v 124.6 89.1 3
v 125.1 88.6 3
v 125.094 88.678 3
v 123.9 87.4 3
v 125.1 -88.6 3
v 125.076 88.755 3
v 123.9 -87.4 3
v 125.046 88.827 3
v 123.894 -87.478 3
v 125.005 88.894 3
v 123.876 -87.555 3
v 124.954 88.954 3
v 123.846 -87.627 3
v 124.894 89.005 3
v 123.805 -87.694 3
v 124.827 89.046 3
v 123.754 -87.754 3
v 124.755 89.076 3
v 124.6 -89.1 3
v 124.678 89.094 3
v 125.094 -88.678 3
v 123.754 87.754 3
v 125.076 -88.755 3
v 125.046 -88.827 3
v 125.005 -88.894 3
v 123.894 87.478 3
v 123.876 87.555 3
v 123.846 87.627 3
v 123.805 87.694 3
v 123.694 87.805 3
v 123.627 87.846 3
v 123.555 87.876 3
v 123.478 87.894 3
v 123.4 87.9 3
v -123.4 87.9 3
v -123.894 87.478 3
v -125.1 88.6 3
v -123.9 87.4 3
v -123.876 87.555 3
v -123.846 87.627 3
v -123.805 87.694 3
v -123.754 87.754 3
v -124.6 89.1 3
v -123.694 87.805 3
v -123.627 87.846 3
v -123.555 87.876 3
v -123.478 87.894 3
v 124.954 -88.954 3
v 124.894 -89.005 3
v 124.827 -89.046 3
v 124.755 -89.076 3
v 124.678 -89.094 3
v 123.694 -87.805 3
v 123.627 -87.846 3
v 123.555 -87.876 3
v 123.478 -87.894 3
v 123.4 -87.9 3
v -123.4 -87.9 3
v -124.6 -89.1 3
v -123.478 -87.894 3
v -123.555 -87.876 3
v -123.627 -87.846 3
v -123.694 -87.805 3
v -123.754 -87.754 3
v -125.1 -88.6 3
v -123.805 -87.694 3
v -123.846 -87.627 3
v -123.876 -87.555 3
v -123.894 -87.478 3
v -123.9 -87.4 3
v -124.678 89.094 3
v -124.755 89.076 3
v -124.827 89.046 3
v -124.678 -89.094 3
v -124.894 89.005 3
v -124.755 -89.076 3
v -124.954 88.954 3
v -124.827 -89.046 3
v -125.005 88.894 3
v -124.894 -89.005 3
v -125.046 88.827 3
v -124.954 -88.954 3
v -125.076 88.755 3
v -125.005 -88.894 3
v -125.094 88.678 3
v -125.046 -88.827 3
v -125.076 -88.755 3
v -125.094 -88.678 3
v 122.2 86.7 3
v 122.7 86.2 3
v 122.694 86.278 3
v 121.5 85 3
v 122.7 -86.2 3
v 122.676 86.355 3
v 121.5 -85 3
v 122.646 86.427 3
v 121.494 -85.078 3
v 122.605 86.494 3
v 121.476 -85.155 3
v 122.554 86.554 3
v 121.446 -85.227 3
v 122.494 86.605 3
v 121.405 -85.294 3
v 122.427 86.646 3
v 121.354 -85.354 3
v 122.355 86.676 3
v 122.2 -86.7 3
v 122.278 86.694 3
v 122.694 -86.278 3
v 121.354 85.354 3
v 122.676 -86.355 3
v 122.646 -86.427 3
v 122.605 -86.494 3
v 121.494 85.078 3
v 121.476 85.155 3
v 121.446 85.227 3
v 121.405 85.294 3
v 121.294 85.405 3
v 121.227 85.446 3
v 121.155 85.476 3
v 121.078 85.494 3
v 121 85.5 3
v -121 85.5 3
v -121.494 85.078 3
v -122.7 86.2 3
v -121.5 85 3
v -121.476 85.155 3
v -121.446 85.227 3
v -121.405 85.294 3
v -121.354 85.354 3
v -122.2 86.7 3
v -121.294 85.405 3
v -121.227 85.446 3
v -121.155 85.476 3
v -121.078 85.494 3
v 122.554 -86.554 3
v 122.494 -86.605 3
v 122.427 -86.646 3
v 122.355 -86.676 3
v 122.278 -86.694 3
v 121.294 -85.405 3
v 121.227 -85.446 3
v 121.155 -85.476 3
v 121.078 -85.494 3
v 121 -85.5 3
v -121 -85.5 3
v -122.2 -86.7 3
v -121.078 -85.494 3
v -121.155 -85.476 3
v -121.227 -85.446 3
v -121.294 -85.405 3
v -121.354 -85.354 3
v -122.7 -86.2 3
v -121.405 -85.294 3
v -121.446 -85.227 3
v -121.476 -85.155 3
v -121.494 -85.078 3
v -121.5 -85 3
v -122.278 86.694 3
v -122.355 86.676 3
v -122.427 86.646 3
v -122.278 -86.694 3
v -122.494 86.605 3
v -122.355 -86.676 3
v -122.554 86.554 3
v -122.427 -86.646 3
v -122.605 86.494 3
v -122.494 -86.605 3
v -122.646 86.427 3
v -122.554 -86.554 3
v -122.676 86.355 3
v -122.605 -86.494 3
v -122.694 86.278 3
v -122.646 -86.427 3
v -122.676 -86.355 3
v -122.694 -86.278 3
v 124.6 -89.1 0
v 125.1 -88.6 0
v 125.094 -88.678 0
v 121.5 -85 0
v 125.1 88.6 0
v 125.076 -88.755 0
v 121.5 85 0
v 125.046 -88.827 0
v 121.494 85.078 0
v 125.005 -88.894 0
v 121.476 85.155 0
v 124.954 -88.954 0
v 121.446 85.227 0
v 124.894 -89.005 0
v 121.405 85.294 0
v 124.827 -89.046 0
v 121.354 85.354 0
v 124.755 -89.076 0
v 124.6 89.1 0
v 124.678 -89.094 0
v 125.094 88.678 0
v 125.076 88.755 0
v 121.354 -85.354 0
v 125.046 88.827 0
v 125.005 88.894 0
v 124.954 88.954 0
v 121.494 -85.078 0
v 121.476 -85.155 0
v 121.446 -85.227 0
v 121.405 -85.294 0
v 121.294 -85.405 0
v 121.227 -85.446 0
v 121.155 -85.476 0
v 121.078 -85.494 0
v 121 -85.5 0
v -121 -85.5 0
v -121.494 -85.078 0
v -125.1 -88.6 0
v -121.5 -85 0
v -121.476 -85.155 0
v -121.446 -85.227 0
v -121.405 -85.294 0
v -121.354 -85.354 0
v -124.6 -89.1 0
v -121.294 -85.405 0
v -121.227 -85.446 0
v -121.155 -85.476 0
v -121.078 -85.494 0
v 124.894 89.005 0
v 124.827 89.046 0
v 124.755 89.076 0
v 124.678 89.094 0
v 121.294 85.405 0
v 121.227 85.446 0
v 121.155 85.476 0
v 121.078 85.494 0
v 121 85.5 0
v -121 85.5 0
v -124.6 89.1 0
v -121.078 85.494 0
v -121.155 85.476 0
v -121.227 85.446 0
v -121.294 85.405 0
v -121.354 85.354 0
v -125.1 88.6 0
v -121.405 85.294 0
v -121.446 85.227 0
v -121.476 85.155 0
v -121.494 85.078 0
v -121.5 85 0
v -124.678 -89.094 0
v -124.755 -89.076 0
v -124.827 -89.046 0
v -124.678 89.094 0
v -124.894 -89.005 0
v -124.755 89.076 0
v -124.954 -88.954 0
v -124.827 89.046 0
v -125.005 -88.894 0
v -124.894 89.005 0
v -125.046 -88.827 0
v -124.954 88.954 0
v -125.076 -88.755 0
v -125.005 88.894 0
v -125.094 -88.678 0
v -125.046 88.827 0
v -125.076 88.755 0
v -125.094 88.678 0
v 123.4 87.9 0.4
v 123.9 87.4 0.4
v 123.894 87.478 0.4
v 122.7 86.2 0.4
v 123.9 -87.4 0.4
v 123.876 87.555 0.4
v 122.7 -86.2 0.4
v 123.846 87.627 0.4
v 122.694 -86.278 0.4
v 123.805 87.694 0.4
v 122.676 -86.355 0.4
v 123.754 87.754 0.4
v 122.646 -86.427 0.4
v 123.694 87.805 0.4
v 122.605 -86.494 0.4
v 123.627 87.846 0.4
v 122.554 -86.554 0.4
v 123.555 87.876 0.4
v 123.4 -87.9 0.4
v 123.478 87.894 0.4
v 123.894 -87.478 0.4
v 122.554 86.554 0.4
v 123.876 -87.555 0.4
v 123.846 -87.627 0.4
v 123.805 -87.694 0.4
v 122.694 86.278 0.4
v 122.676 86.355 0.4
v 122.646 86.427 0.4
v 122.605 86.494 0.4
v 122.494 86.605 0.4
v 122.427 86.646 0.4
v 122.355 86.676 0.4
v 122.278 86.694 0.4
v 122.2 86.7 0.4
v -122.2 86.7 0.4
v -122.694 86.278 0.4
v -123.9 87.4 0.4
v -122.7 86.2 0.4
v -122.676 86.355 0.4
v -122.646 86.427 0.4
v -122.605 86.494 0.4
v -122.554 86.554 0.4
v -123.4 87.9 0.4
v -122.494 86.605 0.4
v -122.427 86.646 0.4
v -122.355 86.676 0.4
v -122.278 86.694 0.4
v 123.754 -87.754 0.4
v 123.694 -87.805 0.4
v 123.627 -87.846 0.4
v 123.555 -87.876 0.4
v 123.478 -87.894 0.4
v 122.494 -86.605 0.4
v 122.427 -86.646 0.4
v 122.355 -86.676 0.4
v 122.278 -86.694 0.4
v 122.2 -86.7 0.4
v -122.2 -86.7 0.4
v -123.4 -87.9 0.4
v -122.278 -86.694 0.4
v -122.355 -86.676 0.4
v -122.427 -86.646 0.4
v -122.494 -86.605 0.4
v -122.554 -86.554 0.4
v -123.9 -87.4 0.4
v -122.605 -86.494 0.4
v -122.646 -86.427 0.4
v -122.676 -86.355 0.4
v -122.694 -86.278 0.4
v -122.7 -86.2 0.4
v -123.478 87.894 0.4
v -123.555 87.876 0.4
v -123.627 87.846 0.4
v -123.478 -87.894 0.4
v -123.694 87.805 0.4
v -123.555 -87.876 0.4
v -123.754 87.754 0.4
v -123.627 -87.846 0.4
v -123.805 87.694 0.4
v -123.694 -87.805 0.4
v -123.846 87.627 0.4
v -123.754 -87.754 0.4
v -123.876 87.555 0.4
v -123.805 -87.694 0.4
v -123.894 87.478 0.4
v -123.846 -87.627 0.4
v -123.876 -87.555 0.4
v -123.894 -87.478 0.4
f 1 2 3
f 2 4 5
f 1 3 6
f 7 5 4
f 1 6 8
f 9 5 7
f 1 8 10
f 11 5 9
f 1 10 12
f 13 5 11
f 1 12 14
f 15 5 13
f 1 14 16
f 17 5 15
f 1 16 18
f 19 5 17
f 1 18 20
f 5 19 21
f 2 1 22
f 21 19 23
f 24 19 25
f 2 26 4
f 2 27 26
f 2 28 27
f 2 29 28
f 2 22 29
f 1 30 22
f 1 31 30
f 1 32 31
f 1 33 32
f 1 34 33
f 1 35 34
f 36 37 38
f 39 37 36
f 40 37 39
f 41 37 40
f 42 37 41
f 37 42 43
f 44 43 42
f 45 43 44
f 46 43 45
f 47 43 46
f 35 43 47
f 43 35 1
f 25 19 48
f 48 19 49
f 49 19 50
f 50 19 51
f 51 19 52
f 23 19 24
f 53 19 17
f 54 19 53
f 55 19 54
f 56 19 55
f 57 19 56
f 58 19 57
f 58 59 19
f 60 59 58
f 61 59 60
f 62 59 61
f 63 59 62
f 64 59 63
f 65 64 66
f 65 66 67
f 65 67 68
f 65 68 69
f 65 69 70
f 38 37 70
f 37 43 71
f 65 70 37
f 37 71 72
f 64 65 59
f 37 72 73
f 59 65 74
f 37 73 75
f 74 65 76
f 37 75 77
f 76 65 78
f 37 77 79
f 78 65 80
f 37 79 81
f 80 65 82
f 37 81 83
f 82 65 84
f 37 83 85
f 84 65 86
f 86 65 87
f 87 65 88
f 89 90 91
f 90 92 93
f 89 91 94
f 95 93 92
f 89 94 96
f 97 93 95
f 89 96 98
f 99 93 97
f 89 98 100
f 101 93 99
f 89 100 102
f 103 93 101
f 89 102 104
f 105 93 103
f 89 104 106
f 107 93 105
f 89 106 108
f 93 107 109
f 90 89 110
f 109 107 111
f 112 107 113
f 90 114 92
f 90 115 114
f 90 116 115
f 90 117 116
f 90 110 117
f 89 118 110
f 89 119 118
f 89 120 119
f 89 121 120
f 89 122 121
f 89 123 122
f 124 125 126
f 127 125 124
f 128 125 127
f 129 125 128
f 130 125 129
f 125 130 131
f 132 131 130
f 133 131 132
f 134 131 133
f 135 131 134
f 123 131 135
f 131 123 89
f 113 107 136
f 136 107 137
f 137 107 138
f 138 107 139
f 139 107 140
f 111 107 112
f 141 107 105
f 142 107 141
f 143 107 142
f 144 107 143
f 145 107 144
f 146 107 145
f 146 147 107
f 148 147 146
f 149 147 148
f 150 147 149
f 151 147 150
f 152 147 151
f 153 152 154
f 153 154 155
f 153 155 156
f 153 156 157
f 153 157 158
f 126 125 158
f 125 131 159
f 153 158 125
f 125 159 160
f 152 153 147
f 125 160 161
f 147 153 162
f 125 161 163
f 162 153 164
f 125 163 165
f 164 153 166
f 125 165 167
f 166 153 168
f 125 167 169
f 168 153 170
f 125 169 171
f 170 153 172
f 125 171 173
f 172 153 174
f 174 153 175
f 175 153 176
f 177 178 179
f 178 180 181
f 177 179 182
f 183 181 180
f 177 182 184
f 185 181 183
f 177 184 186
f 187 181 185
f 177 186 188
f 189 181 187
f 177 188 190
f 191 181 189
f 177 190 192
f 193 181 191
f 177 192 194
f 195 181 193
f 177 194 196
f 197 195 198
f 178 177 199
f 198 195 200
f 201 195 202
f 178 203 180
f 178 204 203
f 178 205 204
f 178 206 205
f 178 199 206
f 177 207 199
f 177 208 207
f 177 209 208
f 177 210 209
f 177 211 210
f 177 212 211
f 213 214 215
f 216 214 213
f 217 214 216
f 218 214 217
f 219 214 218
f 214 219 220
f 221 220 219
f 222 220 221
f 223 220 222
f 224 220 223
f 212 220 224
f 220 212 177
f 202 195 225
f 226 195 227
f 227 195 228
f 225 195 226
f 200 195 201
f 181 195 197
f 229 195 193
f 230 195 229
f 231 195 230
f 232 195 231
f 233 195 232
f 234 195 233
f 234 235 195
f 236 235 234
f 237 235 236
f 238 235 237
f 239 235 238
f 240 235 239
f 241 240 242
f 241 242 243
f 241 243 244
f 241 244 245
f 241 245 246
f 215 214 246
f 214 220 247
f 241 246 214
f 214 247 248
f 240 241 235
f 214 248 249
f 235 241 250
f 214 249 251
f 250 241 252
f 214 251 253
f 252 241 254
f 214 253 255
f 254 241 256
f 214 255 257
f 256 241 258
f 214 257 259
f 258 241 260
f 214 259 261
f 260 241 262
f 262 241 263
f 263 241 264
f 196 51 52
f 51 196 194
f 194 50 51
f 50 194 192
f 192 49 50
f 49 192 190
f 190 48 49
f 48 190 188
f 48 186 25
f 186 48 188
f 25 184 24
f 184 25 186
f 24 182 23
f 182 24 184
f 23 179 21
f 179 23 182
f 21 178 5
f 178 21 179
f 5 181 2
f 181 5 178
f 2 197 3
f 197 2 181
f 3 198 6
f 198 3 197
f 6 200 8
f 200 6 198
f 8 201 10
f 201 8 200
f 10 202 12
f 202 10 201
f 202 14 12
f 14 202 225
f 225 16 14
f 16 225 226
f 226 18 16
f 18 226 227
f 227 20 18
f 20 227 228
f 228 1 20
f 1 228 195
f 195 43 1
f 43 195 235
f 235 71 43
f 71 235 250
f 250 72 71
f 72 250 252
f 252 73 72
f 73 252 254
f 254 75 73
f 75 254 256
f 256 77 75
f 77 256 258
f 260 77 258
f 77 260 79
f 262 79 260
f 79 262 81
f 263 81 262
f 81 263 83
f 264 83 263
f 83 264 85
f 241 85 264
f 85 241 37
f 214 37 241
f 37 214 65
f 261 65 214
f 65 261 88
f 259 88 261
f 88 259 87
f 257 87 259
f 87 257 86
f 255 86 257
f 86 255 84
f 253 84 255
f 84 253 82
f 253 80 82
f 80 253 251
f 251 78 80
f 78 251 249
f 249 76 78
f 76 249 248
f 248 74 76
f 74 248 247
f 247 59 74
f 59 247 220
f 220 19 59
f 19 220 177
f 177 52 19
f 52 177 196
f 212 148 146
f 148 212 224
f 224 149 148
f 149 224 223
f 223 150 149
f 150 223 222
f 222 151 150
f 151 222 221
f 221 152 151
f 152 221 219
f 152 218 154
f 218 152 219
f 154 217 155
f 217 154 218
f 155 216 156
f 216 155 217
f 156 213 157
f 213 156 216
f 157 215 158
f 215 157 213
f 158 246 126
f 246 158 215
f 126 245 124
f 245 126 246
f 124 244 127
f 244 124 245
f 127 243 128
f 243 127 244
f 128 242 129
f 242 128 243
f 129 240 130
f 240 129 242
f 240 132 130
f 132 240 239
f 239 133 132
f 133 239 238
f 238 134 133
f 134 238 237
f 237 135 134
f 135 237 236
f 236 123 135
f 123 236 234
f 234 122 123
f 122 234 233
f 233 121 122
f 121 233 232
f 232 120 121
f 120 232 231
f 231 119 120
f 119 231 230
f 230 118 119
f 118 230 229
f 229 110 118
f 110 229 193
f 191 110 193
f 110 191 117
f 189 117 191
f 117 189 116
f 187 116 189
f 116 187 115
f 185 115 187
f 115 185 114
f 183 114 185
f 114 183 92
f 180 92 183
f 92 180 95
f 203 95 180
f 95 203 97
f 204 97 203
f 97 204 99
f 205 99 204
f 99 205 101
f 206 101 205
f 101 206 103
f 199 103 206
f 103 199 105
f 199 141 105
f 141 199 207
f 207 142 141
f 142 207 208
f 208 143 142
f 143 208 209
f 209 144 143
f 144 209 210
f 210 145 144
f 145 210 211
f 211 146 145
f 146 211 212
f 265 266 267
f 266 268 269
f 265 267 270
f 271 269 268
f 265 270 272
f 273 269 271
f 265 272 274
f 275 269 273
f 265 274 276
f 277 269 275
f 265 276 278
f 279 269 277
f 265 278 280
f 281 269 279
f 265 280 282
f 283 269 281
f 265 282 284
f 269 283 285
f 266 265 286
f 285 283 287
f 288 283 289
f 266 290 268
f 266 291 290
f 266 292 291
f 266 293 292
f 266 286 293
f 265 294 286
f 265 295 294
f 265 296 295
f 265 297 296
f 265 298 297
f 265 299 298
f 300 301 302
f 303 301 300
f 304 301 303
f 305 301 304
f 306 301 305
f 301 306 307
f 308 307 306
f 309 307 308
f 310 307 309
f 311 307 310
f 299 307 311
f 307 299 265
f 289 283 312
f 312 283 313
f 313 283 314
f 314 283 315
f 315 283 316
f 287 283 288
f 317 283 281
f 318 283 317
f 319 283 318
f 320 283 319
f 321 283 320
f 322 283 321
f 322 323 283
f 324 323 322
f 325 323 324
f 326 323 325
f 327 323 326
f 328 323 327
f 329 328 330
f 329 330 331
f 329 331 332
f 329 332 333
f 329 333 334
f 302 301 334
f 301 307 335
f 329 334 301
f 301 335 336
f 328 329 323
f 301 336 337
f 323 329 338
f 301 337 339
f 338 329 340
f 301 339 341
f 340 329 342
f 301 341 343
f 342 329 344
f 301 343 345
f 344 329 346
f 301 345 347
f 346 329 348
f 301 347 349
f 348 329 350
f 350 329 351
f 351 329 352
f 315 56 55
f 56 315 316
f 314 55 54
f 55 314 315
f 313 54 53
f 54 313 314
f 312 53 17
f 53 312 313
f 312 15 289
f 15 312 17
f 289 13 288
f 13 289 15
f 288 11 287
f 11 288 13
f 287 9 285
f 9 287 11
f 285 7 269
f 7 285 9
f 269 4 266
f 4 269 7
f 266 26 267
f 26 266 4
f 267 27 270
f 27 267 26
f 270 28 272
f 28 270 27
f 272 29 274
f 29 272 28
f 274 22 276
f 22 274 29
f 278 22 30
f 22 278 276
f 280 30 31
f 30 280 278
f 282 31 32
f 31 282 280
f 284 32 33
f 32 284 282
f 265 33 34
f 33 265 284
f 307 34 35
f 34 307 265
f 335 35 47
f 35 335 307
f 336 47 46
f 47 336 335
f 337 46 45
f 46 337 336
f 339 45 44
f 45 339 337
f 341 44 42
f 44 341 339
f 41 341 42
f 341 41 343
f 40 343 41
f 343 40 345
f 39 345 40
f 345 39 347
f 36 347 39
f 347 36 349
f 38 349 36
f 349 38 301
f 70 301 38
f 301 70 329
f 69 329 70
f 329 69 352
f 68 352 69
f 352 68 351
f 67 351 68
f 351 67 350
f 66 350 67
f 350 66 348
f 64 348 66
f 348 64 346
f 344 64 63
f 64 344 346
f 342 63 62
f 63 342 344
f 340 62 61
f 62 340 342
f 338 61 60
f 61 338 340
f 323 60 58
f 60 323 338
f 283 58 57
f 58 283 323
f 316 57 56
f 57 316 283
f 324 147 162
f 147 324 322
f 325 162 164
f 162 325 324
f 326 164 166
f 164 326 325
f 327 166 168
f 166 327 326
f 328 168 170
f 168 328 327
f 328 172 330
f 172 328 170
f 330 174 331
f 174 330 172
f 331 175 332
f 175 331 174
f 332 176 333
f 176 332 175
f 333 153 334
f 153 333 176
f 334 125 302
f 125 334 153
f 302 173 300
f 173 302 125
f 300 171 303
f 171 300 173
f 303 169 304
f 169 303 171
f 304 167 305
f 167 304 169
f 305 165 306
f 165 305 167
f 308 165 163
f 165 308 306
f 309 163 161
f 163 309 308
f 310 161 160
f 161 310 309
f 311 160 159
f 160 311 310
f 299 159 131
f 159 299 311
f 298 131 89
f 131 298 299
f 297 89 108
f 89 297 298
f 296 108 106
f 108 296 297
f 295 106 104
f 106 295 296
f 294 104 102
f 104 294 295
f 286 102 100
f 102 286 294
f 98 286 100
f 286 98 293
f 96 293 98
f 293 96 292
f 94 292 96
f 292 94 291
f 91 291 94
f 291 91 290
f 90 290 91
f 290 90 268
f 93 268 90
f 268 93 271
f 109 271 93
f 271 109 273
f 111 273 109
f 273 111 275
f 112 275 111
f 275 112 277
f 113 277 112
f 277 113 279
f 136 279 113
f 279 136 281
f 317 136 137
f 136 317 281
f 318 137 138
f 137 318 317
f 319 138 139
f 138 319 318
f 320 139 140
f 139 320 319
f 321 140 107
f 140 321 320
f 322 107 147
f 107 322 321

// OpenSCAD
include <../lib/solar-node-lib.scad>;
$fn = 40;
gasket_print();
